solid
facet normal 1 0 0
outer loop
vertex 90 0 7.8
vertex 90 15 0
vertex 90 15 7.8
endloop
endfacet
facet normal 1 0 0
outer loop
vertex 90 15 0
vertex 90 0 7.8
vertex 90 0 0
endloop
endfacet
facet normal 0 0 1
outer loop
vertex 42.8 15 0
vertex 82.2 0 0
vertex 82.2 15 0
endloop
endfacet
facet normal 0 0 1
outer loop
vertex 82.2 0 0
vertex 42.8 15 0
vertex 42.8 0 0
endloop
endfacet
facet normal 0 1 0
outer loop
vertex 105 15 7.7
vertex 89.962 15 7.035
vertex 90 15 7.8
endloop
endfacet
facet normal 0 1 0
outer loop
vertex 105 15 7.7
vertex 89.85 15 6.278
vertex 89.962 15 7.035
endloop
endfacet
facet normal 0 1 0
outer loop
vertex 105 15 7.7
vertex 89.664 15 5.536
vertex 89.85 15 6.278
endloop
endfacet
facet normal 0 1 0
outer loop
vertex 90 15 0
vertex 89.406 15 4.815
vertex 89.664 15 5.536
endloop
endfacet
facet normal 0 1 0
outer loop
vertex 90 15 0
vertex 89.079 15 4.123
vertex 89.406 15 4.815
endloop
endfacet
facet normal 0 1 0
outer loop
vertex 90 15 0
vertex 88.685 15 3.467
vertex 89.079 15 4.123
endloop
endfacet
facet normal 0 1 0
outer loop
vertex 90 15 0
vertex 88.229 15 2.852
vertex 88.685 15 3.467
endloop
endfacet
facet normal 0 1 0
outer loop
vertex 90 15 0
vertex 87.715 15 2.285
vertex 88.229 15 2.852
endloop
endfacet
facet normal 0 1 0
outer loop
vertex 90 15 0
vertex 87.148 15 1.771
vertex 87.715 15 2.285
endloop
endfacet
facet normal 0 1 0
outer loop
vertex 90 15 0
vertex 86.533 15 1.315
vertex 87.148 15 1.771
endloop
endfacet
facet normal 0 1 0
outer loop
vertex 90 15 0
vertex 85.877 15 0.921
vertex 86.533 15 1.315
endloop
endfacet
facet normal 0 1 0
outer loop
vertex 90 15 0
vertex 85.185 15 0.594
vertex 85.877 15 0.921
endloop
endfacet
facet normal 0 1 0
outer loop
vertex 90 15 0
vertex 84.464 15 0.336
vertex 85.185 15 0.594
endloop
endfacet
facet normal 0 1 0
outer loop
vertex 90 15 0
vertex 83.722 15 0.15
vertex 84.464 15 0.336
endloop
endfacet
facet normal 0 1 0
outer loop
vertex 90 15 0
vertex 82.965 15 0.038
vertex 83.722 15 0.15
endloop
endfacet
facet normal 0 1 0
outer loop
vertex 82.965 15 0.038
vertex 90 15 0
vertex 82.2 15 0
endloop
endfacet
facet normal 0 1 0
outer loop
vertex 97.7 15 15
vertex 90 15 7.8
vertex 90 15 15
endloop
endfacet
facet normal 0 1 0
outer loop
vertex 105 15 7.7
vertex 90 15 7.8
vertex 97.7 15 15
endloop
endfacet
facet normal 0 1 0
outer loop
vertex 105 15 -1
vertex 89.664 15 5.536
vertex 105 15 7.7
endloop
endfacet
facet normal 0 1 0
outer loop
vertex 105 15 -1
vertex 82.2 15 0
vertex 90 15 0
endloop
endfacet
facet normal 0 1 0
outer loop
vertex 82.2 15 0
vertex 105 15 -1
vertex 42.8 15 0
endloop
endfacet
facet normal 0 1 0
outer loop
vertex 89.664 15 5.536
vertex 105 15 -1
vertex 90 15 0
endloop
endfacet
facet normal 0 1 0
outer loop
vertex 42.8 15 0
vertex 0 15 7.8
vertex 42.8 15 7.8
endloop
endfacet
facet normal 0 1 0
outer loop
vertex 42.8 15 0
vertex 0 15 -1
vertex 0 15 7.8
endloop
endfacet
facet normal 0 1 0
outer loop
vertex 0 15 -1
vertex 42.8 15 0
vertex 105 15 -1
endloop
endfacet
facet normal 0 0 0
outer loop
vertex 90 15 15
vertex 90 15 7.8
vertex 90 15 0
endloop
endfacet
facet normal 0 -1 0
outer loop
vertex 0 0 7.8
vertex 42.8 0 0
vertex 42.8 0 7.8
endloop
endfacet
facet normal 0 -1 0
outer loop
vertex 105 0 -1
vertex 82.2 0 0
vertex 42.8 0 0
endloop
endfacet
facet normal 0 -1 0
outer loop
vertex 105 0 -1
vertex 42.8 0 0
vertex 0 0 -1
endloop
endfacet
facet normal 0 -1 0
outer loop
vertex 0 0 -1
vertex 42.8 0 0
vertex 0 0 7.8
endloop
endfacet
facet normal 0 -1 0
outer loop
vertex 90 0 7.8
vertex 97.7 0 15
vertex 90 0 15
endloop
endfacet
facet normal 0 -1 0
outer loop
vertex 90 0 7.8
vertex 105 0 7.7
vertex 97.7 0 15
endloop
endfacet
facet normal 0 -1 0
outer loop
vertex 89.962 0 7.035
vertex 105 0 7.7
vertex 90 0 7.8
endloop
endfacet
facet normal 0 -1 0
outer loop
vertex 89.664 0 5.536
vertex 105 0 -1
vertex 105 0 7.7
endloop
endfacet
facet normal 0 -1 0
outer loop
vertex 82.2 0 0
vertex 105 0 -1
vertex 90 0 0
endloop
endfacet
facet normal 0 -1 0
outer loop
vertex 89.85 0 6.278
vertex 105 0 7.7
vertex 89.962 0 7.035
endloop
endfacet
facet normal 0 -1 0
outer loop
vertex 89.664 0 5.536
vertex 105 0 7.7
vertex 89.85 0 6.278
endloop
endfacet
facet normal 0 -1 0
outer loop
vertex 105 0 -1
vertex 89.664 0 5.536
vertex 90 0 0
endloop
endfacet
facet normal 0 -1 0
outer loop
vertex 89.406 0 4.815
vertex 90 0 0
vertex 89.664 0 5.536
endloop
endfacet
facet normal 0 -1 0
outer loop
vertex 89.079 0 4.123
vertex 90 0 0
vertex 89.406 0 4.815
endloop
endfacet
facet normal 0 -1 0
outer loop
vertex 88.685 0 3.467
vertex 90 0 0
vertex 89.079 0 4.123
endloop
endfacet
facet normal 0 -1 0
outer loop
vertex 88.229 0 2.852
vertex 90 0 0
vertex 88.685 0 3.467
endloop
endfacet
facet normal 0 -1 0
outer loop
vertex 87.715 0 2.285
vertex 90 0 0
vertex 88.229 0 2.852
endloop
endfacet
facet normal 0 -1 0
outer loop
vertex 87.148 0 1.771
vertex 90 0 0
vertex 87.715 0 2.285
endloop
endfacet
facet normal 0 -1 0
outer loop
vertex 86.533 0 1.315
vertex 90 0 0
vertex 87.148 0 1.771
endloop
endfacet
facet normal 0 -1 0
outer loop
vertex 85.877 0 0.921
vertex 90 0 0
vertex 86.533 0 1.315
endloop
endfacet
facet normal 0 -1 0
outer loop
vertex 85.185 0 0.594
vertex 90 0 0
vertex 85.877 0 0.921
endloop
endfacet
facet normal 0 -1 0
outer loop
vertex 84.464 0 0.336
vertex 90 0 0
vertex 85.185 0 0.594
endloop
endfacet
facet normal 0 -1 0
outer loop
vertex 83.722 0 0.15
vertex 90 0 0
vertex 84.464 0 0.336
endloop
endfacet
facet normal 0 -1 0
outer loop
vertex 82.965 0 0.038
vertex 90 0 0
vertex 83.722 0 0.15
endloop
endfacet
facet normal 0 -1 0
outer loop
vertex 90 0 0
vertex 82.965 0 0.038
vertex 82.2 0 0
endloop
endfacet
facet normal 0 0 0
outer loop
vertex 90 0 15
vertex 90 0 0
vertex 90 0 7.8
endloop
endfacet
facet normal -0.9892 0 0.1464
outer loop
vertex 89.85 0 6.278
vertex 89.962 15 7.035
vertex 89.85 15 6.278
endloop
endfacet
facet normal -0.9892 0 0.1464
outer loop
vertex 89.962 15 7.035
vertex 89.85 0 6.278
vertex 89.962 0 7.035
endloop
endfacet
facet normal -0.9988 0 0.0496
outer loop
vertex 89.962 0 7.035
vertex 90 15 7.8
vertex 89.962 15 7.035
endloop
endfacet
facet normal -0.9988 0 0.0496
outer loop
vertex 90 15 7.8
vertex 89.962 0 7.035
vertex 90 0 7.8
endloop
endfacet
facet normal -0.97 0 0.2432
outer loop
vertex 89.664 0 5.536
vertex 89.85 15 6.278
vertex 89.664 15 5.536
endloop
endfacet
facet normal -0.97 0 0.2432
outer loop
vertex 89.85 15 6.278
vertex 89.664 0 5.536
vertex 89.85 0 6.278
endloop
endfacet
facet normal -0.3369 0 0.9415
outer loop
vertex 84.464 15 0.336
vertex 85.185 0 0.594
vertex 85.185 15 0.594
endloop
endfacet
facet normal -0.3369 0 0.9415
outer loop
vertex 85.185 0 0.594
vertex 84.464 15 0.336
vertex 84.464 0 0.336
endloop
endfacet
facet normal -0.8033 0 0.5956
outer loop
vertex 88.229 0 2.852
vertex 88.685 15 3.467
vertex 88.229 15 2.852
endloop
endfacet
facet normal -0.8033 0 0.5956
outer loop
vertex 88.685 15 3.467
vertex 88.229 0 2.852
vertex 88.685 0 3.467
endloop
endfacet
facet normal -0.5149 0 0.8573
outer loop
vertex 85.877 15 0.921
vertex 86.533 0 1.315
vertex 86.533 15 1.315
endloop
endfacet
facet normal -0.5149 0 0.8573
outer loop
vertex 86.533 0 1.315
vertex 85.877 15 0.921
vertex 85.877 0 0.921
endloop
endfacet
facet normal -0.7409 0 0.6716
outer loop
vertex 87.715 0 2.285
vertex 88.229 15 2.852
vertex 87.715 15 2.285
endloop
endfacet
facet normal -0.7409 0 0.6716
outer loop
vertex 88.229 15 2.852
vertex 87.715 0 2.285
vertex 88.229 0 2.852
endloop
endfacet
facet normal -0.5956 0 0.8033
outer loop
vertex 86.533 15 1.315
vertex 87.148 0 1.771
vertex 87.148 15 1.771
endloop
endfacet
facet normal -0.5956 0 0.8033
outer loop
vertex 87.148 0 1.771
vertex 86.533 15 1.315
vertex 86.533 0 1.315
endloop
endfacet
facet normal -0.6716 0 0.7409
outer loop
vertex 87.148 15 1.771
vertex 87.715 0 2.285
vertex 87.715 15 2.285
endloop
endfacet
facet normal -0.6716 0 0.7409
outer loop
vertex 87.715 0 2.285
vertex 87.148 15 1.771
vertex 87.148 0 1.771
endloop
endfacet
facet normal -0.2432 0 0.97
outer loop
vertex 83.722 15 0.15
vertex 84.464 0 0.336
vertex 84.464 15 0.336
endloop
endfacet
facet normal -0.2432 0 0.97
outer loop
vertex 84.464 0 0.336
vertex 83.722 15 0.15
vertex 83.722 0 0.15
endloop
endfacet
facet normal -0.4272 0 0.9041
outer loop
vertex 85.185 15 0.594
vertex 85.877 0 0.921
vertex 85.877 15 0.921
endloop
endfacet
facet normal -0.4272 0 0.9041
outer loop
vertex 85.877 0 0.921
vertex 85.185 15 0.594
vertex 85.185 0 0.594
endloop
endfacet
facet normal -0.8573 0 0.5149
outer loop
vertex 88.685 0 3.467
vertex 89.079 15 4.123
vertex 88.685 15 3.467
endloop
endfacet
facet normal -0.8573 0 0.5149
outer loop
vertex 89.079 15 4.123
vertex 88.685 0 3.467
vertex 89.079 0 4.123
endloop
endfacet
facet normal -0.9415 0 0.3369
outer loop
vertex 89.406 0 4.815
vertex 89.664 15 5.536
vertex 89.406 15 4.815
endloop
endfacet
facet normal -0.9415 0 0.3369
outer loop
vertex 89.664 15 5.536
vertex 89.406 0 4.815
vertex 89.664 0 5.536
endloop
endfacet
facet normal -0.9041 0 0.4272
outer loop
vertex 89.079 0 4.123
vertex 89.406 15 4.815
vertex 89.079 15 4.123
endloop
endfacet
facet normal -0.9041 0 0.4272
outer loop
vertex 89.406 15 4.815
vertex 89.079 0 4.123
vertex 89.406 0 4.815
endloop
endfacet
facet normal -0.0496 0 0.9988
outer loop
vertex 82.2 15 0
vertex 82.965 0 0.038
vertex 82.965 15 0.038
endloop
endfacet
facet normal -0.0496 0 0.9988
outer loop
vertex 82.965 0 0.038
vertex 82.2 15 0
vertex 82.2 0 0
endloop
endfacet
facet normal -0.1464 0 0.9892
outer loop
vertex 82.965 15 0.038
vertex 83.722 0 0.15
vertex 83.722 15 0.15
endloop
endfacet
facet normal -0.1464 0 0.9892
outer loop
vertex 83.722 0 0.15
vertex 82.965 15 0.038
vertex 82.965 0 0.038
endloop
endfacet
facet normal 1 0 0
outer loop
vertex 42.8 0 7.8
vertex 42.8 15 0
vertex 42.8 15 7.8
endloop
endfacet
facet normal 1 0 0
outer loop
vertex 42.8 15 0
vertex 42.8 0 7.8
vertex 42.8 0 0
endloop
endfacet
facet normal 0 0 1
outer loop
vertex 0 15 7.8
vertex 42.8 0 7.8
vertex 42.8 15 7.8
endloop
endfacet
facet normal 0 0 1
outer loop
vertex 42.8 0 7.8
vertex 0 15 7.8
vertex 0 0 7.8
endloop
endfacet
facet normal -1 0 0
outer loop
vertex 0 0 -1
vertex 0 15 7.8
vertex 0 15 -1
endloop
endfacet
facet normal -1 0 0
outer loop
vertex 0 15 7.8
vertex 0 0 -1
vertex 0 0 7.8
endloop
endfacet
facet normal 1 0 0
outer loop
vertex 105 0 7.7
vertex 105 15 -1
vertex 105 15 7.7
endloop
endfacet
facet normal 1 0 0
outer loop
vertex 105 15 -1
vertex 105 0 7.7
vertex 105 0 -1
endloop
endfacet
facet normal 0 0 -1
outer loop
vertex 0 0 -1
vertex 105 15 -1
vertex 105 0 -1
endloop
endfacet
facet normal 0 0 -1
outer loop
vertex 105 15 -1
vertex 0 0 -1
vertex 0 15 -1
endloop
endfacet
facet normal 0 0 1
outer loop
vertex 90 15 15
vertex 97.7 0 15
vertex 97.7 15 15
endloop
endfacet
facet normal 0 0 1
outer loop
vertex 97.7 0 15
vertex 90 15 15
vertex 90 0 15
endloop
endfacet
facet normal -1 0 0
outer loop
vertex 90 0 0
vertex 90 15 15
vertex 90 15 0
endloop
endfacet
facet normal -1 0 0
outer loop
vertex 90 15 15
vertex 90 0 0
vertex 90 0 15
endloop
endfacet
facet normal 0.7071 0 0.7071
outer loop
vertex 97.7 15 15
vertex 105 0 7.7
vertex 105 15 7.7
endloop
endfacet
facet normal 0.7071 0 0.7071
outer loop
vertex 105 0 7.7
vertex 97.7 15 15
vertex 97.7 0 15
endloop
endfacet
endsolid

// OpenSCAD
width = 15;
mount = [42.8, width, 7.8];
leg = [130 - 40, width, 1];
cap = [width, width, 15];
chamfer = width / 2;

module straight_edge_cutter() {
    difference() {
        union() {
            cube(mount);
            translate([0,0,-leg.z]) cube([leg.x+cap.x, leg.y, leg.z]);
            translate([leg.x,0,0]) cube(cap);

            translate([leg.x-mount.z, 0, 0])
            difference() {
                cube([mount.z, width, mount.z]);
                translate([0, -0.1, mount.z])
                rotate([-90, 0, 0])
                cylinder(r=mount.z, h=width+0.2, $fn=64);
            }
        }
        translate([leg.x+cap.x+0.1, leg.y+0.1, cap.z+ 0.1])
        rotate([90, 180, 0])
        linear_extrude(height=cap.y+0.2)
        polygon([
            [0, 0],
            [chamfer, 0],
            [0, chamfer]
        ]);
    }
}

//output:straight_edge_cutter:straight_edge_cutter();

//view
straight_edge_cutter();
